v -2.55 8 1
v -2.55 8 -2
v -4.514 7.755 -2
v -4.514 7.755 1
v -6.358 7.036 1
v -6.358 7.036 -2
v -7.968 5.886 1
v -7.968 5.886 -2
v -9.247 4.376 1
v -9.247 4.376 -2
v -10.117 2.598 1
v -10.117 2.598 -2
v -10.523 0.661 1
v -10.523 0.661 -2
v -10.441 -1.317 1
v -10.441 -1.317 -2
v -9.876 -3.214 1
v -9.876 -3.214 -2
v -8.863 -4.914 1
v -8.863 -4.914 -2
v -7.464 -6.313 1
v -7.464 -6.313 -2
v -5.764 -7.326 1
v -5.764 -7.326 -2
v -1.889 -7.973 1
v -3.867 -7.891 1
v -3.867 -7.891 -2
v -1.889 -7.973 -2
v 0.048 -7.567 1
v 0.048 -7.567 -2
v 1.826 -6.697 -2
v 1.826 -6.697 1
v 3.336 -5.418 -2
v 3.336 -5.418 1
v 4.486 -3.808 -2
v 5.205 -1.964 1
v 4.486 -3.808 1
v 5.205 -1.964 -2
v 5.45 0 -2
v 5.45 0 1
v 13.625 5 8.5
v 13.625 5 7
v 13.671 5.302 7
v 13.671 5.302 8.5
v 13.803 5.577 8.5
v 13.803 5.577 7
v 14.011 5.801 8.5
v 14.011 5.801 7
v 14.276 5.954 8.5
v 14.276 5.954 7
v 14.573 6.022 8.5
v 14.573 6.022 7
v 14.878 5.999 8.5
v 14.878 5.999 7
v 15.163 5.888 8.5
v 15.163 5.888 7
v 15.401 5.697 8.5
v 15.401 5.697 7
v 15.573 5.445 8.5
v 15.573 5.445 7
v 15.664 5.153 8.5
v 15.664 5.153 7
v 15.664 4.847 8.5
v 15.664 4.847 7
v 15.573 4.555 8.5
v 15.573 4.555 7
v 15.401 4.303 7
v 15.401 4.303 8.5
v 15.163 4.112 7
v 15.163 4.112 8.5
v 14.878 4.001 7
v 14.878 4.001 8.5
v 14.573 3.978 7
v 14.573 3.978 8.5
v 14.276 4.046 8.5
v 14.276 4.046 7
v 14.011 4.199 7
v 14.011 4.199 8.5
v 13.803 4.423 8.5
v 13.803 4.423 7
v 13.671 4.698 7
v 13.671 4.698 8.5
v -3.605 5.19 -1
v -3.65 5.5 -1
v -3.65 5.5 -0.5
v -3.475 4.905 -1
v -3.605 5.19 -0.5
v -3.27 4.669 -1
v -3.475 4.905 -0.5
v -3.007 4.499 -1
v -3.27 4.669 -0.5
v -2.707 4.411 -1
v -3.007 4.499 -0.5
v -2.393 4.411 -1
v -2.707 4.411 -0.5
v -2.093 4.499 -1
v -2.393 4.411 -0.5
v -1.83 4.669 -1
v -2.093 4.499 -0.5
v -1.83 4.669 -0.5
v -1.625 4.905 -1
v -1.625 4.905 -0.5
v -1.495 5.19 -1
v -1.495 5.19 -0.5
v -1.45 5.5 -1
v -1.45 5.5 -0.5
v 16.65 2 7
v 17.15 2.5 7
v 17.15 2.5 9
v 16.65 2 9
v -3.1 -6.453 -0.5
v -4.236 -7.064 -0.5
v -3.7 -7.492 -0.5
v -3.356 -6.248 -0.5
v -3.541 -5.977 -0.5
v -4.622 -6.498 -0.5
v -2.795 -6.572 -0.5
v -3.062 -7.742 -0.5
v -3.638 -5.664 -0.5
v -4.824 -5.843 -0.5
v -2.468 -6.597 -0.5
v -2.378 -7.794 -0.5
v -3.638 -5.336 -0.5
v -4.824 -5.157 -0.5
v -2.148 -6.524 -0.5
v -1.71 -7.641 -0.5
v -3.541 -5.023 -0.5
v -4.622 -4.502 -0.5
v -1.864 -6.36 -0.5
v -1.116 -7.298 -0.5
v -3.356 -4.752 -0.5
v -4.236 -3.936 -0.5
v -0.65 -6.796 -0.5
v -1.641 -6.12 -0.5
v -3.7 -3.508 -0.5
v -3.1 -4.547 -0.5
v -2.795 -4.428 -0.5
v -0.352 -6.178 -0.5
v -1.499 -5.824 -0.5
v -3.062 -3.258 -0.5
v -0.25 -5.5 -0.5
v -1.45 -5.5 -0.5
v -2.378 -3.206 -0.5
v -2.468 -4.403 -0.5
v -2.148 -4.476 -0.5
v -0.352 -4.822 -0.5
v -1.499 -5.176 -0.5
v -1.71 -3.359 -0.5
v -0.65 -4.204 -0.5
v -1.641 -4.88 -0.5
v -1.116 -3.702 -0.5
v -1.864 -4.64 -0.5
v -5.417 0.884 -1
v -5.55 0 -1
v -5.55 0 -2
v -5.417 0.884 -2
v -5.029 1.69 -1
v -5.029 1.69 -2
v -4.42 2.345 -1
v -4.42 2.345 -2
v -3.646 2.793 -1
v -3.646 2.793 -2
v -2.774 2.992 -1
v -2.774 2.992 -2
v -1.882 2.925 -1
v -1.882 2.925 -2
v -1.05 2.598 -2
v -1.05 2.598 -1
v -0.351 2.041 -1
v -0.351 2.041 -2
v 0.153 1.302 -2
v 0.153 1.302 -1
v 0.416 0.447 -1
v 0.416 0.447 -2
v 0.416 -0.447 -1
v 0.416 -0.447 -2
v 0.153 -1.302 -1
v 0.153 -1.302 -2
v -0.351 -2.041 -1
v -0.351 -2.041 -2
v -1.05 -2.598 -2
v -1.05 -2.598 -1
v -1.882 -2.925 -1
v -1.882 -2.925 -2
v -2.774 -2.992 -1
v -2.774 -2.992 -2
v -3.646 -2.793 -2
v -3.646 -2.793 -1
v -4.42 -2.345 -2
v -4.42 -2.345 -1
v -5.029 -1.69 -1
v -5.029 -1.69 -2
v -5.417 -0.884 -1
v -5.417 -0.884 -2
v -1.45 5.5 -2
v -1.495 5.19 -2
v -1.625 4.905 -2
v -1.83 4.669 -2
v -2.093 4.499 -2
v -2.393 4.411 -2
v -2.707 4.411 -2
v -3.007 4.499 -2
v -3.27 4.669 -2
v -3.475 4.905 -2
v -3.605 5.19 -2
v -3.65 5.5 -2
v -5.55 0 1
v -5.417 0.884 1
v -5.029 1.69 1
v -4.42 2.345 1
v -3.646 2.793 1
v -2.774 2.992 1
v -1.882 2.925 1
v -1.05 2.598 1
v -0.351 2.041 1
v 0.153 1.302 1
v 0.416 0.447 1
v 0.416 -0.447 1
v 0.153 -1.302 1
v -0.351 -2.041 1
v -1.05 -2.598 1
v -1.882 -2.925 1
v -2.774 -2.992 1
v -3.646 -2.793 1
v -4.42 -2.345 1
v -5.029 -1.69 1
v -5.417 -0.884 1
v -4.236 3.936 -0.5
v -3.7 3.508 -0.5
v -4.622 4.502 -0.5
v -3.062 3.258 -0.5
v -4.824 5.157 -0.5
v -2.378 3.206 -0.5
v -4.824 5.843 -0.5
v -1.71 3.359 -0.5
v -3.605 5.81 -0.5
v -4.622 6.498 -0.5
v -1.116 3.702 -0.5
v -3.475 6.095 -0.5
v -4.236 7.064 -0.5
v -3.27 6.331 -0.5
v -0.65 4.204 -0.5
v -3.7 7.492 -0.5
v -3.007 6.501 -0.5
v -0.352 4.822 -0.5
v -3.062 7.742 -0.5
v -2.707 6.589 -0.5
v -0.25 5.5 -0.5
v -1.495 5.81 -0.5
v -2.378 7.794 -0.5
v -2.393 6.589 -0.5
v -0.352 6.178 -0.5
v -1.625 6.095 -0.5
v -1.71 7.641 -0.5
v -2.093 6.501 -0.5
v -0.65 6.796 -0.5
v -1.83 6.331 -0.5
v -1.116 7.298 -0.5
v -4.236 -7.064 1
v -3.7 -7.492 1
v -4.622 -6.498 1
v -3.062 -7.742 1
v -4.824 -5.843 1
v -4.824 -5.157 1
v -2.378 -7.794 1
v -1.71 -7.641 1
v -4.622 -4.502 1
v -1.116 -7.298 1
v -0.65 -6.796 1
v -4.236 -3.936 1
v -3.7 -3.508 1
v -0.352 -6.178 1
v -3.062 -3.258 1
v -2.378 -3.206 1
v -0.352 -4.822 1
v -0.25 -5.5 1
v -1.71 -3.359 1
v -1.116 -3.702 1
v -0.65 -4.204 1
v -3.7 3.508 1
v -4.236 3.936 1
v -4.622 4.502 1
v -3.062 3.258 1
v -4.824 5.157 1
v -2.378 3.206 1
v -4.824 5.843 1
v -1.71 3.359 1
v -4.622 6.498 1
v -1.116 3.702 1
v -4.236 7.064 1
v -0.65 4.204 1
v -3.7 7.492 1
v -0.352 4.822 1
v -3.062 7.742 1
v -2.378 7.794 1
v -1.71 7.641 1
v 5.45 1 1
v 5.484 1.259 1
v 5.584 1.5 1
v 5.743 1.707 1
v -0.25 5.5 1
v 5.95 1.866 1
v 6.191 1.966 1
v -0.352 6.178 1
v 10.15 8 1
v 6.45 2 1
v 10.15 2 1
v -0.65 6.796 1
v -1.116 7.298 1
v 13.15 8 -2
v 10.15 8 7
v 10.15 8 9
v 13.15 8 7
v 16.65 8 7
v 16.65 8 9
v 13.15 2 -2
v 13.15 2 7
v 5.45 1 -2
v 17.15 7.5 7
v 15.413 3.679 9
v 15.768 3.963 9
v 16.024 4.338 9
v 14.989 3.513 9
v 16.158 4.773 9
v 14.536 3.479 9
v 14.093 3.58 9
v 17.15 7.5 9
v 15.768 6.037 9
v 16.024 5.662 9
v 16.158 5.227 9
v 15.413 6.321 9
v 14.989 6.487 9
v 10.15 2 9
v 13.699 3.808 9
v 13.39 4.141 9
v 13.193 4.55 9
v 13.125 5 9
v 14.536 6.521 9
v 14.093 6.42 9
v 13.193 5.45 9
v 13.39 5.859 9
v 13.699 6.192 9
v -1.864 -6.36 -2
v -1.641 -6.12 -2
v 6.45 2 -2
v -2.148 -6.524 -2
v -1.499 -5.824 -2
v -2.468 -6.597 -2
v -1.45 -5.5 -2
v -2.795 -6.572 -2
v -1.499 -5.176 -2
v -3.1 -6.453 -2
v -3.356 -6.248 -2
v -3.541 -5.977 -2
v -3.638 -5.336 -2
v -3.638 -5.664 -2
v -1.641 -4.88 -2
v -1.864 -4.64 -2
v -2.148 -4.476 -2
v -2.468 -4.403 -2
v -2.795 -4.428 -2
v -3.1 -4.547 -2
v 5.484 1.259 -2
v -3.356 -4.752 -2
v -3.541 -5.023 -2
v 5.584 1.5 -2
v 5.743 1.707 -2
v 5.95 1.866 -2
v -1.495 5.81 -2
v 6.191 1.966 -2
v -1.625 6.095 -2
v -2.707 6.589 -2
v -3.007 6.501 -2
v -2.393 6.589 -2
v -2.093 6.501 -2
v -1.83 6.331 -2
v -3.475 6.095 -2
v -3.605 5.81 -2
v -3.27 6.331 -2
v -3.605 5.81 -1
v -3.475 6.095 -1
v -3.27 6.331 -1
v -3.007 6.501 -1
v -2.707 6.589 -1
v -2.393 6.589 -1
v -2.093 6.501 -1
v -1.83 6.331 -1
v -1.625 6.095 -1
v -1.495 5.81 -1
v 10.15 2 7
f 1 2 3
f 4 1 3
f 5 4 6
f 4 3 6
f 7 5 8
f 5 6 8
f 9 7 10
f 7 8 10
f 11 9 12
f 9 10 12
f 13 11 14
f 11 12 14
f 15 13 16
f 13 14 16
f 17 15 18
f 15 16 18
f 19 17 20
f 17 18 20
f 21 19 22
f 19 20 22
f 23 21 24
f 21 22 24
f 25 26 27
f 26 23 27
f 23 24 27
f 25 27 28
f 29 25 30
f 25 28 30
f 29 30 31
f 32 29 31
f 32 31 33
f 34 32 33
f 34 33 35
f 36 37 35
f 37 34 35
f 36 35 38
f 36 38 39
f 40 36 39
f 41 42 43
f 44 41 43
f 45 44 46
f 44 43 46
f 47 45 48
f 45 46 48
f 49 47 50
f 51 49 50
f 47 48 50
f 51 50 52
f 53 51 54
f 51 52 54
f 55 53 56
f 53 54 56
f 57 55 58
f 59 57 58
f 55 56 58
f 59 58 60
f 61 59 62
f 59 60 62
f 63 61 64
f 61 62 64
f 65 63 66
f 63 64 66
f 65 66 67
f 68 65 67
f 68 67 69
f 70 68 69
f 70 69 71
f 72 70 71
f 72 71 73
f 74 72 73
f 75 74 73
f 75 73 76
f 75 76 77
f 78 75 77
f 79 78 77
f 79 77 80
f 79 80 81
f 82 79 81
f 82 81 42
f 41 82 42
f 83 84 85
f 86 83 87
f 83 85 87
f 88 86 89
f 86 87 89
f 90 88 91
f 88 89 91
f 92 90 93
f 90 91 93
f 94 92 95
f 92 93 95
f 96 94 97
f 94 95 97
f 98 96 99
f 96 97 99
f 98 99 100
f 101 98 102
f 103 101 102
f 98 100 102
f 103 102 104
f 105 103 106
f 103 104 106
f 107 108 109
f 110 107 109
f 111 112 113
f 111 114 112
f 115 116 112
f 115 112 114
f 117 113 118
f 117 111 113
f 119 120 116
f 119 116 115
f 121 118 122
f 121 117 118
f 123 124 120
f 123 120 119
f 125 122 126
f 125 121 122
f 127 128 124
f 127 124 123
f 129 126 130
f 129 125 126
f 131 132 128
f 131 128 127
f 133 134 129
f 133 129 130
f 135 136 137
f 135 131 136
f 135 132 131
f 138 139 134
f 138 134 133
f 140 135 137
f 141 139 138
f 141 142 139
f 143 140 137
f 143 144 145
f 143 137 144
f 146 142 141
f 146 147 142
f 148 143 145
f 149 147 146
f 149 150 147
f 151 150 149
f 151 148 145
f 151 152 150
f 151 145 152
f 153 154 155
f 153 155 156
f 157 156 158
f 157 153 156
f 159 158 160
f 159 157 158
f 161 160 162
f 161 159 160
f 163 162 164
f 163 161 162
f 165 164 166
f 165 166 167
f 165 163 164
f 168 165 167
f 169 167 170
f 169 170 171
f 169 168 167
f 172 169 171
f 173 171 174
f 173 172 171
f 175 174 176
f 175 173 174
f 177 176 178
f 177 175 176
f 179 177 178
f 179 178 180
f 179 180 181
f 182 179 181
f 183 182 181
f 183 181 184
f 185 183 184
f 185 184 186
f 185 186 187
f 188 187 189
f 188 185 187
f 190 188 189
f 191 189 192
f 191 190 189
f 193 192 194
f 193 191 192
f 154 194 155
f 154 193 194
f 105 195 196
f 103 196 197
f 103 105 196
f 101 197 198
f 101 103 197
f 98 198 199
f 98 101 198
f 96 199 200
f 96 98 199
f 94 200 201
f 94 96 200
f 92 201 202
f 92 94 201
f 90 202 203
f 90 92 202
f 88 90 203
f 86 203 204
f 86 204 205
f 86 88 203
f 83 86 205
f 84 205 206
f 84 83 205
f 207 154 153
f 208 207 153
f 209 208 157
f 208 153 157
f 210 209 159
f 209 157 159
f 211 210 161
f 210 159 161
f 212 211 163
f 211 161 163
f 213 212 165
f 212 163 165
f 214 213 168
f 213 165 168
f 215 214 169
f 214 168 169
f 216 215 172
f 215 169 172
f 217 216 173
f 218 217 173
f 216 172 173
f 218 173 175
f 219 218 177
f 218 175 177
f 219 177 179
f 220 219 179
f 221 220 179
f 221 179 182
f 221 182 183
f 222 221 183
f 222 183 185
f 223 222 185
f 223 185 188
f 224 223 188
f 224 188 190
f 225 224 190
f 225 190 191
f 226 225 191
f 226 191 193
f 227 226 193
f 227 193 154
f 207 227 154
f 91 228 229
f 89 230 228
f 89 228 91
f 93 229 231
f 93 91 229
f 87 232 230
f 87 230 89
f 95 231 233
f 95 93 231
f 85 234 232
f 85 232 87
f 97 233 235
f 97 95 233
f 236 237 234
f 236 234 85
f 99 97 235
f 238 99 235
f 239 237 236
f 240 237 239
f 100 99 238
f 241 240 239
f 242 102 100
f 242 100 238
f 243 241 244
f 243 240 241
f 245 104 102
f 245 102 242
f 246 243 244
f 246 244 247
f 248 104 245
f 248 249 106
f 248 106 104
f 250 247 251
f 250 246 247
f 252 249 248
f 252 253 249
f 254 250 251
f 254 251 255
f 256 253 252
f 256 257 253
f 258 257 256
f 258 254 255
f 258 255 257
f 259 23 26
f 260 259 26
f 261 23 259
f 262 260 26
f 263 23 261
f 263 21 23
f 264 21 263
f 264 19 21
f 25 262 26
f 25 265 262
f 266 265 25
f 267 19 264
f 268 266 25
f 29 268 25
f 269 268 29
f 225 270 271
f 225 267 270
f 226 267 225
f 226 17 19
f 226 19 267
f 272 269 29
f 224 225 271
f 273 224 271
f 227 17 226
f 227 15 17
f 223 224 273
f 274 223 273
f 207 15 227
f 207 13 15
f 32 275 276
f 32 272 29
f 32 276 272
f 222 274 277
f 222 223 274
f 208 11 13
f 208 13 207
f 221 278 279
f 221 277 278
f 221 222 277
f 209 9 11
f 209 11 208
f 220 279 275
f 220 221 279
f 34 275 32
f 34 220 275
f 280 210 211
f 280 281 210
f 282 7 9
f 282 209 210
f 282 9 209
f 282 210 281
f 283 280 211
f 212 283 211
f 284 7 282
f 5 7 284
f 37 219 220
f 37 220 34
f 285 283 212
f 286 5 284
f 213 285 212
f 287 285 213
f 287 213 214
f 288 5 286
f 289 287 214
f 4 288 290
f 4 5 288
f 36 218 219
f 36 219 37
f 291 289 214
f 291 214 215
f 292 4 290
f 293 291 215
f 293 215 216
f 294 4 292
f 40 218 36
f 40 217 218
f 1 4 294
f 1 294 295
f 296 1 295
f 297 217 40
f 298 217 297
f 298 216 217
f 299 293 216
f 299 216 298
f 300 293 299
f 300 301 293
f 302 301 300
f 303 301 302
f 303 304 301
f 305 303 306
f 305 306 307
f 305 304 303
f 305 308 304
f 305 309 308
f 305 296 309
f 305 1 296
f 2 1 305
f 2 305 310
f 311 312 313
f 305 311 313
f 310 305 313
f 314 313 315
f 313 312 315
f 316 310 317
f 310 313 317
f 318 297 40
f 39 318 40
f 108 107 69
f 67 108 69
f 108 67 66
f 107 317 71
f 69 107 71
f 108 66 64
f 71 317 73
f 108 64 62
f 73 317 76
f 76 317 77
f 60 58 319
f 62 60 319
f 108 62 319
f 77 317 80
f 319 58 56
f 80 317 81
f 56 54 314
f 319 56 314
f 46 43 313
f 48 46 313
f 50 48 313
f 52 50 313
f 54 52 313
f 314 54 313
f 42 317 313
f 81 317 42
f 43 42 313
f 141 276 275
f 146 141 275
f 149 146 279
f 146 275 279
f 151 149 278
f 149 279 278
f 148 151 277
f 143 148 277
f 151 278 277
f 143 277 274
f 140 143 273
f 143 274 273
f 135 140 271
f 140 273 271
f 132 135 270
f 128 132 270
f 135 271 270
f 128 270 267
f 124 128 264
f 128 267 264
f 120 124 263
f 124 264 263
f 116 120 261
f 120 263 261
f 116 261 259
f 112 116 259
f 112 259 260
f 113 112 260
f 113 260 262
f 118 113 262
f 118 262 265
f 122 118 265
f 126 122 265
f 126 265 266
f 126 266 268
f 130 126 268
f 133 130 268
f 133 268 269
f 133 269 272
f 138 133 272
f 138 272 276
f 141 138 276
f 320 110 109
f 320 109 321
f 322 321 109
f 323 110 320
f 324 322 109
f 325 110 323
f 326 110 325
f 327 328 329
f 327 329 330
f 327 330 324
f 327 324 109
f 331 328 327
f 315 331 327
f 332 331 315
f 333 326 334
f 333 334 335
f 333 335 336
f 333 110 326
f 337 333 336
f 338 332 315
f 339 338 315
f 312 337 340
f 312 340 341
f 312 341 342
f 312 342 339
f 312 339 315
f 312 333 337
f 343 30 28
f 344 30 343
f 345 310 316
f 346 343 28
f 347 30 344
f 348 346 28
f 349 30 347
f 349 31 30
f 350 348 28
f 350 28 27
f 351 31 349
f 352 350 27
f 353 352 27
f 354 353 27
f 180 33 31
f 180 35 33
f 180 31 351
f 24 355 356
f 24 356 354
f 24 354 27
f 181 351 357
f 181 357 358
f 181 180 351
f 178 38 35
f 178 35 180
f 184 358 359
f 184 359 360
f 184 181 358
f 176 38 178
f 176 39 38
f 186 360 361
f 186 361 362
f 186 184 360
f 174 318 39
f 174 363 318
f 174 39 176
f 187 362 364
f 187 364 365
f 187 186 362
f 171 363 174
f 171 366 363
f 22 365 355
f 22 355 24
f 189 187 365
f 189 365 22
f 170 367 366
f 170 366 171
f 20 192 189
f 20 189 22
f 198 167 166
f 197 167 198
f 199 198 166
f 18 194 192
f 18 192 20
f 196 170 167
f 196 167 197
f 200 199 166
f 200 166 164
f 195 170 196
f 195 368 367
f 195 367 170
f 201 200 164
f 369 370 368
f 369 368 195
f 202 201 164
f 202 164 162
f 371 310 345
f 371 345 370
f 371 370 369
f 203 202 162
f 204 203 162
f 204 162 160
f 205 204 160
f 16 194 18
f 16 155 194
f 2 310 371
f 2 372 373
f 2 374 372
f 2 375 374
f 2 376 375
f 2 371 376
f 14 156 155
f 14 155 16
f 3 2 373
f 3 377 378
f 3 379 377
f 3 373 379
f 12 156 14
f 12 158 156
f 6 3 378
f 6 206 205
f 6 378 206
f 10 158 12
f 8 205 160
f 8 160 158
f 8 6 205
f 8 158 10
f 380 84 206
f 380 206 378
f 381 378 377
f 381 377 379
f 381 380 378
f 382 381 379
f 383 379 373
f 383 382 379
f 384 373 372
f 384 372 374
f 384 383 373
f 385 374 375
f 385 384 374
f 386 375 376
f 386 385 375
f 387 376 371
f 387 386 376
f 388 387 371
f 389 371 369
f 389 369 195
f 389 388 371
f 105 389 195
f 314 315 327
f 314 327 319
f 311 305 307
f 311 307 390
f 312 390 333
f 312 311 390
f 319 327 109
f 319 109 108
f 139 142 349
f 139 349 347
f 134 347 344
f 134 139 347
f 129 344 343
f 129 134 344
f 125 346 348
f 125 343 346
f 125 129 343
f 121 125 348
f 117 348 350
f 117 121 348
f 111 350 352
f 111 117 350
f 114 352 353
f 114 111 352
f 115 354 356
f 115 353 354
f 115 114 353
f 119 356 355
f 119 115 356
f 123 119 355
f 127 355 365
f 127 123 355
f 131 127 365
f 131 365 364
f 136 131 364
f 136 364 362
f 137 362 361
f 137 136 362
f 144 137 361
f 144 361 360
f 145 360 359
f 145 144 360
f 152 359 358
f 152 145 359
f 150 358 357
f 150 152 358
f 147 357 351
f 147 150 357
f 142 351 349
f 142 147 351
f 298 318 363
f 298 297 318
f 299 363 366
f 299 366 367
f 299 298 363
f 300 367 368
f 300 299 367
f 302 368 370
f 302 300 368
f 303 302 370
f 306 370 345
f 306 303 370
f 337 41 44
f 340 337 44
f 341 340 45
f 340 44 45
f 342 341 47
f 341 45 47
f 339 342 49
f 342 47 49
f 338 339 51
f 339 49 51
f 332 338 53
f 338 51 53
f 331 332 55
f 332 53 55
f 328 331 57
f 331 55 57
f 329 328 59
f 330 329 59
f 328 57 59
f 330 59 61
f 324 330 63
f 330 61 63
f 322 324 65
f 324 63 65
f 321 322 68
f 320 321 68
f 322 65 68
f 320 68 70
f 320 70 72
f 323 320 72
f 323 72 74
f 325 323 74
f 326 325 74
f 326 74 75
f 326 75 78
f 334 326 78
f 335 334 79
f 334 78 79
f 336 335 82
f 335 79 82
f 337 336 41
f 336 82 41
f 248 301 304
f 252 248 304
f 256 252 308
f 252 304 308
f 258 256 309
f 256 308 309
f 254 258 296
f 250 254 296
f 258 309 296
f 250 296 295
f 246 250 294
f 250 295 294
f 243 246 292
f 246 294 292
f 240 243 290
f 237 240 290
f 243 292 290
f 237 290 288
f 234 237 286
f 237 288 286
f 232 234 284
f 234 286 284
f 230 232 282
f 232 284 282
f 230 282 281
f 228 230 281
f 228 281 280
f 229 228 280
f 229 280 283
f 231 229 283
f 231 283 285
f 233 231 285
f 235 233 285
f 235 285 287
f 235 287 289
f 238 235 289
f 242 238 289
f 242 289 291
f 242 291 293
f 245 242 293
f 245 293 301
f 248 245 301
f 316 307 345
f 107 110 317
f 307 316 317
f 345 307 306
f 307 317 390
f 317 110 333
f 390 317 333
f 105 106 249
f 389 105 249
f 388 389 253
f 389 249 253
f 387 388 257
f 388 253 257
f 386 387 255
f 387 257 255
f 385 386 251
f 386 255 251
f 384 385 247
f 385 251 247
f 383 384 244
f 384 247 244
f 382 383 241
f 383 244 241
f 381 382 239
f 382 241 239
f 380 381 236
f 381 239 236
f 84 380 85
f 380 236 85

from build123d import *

# Parameters (mm, degrees)
SKETCH_1_W                = 14.3
SKETCH_1_H                = 16
EXTRUDE_1_DEPTH           = 1
SKETCH_3_R                = 3
CUT_EXTRUDE_3_DEPTH       = 10
SKETCH_4_R                = 1.25
CUT_EXTRUDE_4_DEPTH       = 2
CHAMFER_2_SIZE            = 3
SKETCH1_W                 = 2
SKETCH1_H                 = 16
EXTRUDE1_DEPTH            = 8
SKETCH2_W                 = 2
SKETCH2_H                 = 16
EXTRUDE2_DEPTH            = 10
SKETCH3_W                 = 14.3
SKETCH3_H                 = 10
EXTRUDE3_DEPTH            = 10
HOLE_WIZARD_M2_5_2_D      = 2.05
HOLE_WIZARD_M2_5_2_DEPTH  = 7.25
HOLE_WIZARD_M2_5_2_TIP    = 0.615882135
CHAMFER1_SIZE             = 3
CHAMFER4_SIZE             = 0.5
EXTRUDE4_DEPTH            = 6
SKETCH7_W                 = 2
SKETCH7_H                 = 6
EXTRUDE5_DEPTH            = 10
CHAMFER5_SIZE             = 0.5
EXTRUDE6_START            = -2
SKETCH8_W                 = 16
SKETCH8_H                 = 16
SKETCH8_R                 = 3
EXTRUDE6_DEPTH            = 2
SKETCH9_R                 = 1.1
EXTRUDE7_DEPTH            = 21.545619971
SKETCH12_W                = 6
SKETCH12_H                = 6
EXTRUDE10_DEPTH           = 0.5
SKETCH13_W                = 8
SKETCH13_H                = 6
EXTRUDE11_DEPTH           = 0.5
SKETCH15_R                = 1.1
SKETCH15_R_2              = 3
EXTRUDE13_DEPTH           = 1
CUT_EXTRUDE_1_DEPTH       = 10
HOLE_WIZARD_1_D           = 2.2
HOLE_WIZARD_1_CBORE_D     = 4.6
HOLE_WIZARD_1_CBORE_DEPTH = 1.5
FILLET_3_R                = 1
SKETCH_12_W               = 8.120884579
SKETCH_12_H               = 6.489865184
CUT_EXTRUDE_2_DEPTH       = 10


with BuildPart() as part:
    # 草图1 → 拉伸1 (new, symmetric)
    with BuildSketch(Plane.XY):
        Rectangle(SKETCH_1_W, SKETCH_1_H)
    extrude(amount=EXTRUDE_1_DEPTH, both=True)

    # 草图3 → 拉伸3 (cut)
    with BuildSketch(Plane(origin=(0, 0, -1), x_dir=(-1, 0, 0), z_dir=(0, 0, -1))):
        with Locations((2.55, 0)):
            Circle(SKETCH_3_R)
    extrude(amount=-CUT_EXTRUDE_3_DEPTH, mode=Mode.SUBTRACT)

    # 草图4 → 拉伸4 (cut)
    with BuildSketch(Plane(origin=(0, 0, -1), x_dir=(-1, 0, 0), z_dir=(0, 0, -1))):
        with Locations((2.55, 5)):
            Circle(SKETCH_4_R)
        with Locations((2.55, -5)):
            Circle(SKETCH_4_R)
    extrude(amount=-CUT_EXTRUDE_4_DEPTH, mode=Mode.SUBTRACT)

    # 倒角2
    chamfer_2_edges = [part.edges().sort_by_distance(p)[0] for p in [
        (-7.15, 8, 0),
        (-7.15, -8, 0),
    ]]
    chamfer(chamfer_2_edges, length=CHAMFER_2_SIZE)

    # Sketch1 → Extrude1 (add)
    with BuildSketch(Plane.XY.offset(1)):
        with Locations((6.15, 0)):
            Rectangle(SKETCH1_W, SKETCH1_H)
    extrude(amount=EXTRUDE1_DEPTH)

    # Sketch2 → Extrude2 (add)
    with BuildSketch(Plane(origin=(7.15, 0, 0), x_dir=(0, 0, -1), z_dir=(1, 0, 0))):
        with Locations((-8, 0)):
            Rectangle(SKETCH2_W, SKETCH2_H)
    extrude(amount=EXTRUDE2_DEPTH)

    # Sketch3 → Extrude3 (cut)
    with BuildSketch(Plane.XZ.offset(8)):
        with Locations((10, 4)):
            Rectangle(SKETCH3_W, SKETCH3_H)
    extrude(amount=-EXTRUDE3_DEPTH, mode=Mode.SUBTRACT)

    # M2.5 螺纹孔2
    with Locations(Plane(origin=(14.65, 5, 9), x_dir=(1, 0, 0), z_dir=(0, 0, 1))):
        with Locations((0, 0)):
            Hole(HOLE_WIZARD_M2_5_2_D / 2, depth=HOLE_WIZARD_M2_5_2_DEPTH)
            with Locations((0, 0, -(HOLE_WIZARD_M2_5_2_DEPTH + HOLE_WIZARD_M2_5_2_TIP / 2))):  # 118° drill point
                Cone(0, HOLE_WIZARD_M2_5_2_D / 2, HOLE_WIZARD_M2_5_2_TIP, mode=Mode.SUBTRACT)

    # Chamfer1
    chamfer1_edges = [part.edges().sort_by_distance(p)[0] for p in [
        (2.85, -8, 0),
    ]]
    chamfer(chamfer1_edges, length=CHAMFER1_SIZE)

    # Chamfer4
    chamfer4_edges = [part.edges().sort_by_distance(p)[0] for p in [
        (15.675, 5, 9),
    ]]
    chamfer(chamfer4_edges, length=CHAMFER4_SIZE)

    # Sketch6 → Extrude4 (add)
    with BuildSketch(Plane(origin=(0, 8, 0), x_dir=(-1, 0, 0), z_dir=(0, 1, 0))):
        Polygon((-10.65, 7), (-12.65, 7), (-12.65, -1), (-7.15, -1), (-5.15, 1), (-10.65, 1), align=None)
    extrude(amount=-EXTRUDE4_DEPTH)

    # Sketch7 → Extrude5 (cut)
    with BuildSketch(Plane.XZ.offset(-2)):
        with Locations((6.15, 4)):
            Rectangle(SKETCH7_W, SKETCH7_H)
    extrude(amount=-EXTRUDE5_DEPTH, mode=Mode.SUBTRACT)

    # Chamfer5
    chamfer5_edges = [part.edges().sort_by_distance(p)[0] for p in [
        (17.15, 8, 8),
        (17.15, 2, 8),
        (5.15, 2, 8),
        (5.15, 8, 8),
    ]]
    chamfer(chamfer5_edges, length=CHAMFER5_SIZE)

    # Sketch8 → Extrude6 (add)
    with BuildSketch(Plane.XY.offset(1).offset(EXTRUDE6_START)):
        with Locations((-2.55, 0)):
            Rectangle(SKETCH8_W, SKETCH8_H)
        with Locations(Location((-2.55, 0, 0), (0, 0, 180))):
            Circle(SKETCH8_R, mode=Mode.SUBTRACT)
    extrude(amount=EXTRUDE6_DEPTH)

    # Sketch9 → Extrude7 (cut, through all)
    with BuildSketch(Plane.XY.offset(1)):
        with Locations((-2.55, -5.5)):
            Circle(SKETCH9_R)
        with Locations((-2.55, 5.5)):
            Circle(SKETCH9_R)
    extrude(amount=-EXTRUDE7_DEPTH, mode=Mode.SUBTRACT)

    # Sketch12 → Extrude10 (add)
    with BuildSketch(Plane.ZY.offset(-10.65)):
        with Locations((4, 5)):
            Rectangle(SKETCH12_W, SKETCH12_H)
    extrude(amount=EXTRUDE10_DEPTH)

    # Sketch13 → Extrude11 (add)
    with BuildSketch(Plane(origin=(12.65, 0, 0), x_dir=(0, 0, -1), z_dir=(1, 0, 0))):
        with Locations((-3, 5)):
            Rectangle(SKETCH13_W, SKETCH13_H)
    extrude(amount=EXTRUDE11_DEPTH)

    # Sketch15 → Extrude13 (add)
    with BuildSketch(Plane(origin=(0, 0, -1), x_dir=(-1, 0, 0), z_dir=(0, 0, -1))):
        Polygon((10.55, -8), (10.55, 8), (-13.15, 8), (-13.15, 2), (-5.45, 2), (-5.45, -8), align=None)
        with Locations(Location((2.55, 5.5, 0), (0, 0, 180))):
            Circle(SKETCH15_R, mode=Mode.SUBTRACT)
        with Locations(Location((2.55, -5.5, 0), (0, 0, 180))):
            Circle(SKETCH15_R, mode=Mode.SUBTRACT)
        with Locations((2.55, 0)):
            Circle(SKETCH15_R_2, mode=Mode.SUBTRACT)
    extrude(amount=EXTRUDE13_DEPTH)

    # 草图9 → 切除-拉伸1 (cut)
    with BuildSketch(Plane(origin=(0, 0, -2), x_dir=(-1, 0, 0), z_dir=(0, 0, -1))):
        with BuildLine():
            Line((-5.45, 0), (-5.45, -9.75102195))
            Line((-5.45, -9.75102195), (10.872695199, -9.75102195))
            Line((10.872695199, -9.75102195), (10.872695199, 8))
            Line((10.872695199, 8), (10.55, 8))
            Line((10.55, 8), (2.55, 8))
            ThreePointArc((2.55, 8), (8.206854249, -5.656854249), (-5.45, 0))
        make_face()
    extrude(amount=-CUT_EXTRUDE_1_DEPTH, mode=Mode.SUBTRACT)

    # 打孔尺寸(%根据)内六角圆柱头螺钉的类型1 (through all)
    with Locations(Plane.XY.offset(1)):
        with Locations((-2.55, 5.5), (-2.55, -5.5)):
            CounterBoreHole(HOLE_WIZARD_1_D / 2, HOLE_WIZARD_1_CBORE_D / 2, HOLE_WIZARD_1_CBORE_DEPTH)

    # 圆角3
    fillet_3_edges = [part.edges().sort_by_distance(p)[0] for p in [
        (5.45, 2, -0.5),
    ]]
    fillet(fillet_3_edges, radius=FILLET_3_R)

    # 草图12 → 切除-拉伸2 (cut)
    with BuildSketch(Plane(origin=(0, 8, 0), x_dir=(1, 0, 0), z_dir=(0, 1, 0))):
        with Locations((6.089557711, -7.244932592)):
            Rectangle(SKETCH_12_W, SKETCH_12_H)
    extrude(amount=-CUT_EXTRUDE_2_DEPTH, mode=Mode.SUBTRACT)


solid = part.part
